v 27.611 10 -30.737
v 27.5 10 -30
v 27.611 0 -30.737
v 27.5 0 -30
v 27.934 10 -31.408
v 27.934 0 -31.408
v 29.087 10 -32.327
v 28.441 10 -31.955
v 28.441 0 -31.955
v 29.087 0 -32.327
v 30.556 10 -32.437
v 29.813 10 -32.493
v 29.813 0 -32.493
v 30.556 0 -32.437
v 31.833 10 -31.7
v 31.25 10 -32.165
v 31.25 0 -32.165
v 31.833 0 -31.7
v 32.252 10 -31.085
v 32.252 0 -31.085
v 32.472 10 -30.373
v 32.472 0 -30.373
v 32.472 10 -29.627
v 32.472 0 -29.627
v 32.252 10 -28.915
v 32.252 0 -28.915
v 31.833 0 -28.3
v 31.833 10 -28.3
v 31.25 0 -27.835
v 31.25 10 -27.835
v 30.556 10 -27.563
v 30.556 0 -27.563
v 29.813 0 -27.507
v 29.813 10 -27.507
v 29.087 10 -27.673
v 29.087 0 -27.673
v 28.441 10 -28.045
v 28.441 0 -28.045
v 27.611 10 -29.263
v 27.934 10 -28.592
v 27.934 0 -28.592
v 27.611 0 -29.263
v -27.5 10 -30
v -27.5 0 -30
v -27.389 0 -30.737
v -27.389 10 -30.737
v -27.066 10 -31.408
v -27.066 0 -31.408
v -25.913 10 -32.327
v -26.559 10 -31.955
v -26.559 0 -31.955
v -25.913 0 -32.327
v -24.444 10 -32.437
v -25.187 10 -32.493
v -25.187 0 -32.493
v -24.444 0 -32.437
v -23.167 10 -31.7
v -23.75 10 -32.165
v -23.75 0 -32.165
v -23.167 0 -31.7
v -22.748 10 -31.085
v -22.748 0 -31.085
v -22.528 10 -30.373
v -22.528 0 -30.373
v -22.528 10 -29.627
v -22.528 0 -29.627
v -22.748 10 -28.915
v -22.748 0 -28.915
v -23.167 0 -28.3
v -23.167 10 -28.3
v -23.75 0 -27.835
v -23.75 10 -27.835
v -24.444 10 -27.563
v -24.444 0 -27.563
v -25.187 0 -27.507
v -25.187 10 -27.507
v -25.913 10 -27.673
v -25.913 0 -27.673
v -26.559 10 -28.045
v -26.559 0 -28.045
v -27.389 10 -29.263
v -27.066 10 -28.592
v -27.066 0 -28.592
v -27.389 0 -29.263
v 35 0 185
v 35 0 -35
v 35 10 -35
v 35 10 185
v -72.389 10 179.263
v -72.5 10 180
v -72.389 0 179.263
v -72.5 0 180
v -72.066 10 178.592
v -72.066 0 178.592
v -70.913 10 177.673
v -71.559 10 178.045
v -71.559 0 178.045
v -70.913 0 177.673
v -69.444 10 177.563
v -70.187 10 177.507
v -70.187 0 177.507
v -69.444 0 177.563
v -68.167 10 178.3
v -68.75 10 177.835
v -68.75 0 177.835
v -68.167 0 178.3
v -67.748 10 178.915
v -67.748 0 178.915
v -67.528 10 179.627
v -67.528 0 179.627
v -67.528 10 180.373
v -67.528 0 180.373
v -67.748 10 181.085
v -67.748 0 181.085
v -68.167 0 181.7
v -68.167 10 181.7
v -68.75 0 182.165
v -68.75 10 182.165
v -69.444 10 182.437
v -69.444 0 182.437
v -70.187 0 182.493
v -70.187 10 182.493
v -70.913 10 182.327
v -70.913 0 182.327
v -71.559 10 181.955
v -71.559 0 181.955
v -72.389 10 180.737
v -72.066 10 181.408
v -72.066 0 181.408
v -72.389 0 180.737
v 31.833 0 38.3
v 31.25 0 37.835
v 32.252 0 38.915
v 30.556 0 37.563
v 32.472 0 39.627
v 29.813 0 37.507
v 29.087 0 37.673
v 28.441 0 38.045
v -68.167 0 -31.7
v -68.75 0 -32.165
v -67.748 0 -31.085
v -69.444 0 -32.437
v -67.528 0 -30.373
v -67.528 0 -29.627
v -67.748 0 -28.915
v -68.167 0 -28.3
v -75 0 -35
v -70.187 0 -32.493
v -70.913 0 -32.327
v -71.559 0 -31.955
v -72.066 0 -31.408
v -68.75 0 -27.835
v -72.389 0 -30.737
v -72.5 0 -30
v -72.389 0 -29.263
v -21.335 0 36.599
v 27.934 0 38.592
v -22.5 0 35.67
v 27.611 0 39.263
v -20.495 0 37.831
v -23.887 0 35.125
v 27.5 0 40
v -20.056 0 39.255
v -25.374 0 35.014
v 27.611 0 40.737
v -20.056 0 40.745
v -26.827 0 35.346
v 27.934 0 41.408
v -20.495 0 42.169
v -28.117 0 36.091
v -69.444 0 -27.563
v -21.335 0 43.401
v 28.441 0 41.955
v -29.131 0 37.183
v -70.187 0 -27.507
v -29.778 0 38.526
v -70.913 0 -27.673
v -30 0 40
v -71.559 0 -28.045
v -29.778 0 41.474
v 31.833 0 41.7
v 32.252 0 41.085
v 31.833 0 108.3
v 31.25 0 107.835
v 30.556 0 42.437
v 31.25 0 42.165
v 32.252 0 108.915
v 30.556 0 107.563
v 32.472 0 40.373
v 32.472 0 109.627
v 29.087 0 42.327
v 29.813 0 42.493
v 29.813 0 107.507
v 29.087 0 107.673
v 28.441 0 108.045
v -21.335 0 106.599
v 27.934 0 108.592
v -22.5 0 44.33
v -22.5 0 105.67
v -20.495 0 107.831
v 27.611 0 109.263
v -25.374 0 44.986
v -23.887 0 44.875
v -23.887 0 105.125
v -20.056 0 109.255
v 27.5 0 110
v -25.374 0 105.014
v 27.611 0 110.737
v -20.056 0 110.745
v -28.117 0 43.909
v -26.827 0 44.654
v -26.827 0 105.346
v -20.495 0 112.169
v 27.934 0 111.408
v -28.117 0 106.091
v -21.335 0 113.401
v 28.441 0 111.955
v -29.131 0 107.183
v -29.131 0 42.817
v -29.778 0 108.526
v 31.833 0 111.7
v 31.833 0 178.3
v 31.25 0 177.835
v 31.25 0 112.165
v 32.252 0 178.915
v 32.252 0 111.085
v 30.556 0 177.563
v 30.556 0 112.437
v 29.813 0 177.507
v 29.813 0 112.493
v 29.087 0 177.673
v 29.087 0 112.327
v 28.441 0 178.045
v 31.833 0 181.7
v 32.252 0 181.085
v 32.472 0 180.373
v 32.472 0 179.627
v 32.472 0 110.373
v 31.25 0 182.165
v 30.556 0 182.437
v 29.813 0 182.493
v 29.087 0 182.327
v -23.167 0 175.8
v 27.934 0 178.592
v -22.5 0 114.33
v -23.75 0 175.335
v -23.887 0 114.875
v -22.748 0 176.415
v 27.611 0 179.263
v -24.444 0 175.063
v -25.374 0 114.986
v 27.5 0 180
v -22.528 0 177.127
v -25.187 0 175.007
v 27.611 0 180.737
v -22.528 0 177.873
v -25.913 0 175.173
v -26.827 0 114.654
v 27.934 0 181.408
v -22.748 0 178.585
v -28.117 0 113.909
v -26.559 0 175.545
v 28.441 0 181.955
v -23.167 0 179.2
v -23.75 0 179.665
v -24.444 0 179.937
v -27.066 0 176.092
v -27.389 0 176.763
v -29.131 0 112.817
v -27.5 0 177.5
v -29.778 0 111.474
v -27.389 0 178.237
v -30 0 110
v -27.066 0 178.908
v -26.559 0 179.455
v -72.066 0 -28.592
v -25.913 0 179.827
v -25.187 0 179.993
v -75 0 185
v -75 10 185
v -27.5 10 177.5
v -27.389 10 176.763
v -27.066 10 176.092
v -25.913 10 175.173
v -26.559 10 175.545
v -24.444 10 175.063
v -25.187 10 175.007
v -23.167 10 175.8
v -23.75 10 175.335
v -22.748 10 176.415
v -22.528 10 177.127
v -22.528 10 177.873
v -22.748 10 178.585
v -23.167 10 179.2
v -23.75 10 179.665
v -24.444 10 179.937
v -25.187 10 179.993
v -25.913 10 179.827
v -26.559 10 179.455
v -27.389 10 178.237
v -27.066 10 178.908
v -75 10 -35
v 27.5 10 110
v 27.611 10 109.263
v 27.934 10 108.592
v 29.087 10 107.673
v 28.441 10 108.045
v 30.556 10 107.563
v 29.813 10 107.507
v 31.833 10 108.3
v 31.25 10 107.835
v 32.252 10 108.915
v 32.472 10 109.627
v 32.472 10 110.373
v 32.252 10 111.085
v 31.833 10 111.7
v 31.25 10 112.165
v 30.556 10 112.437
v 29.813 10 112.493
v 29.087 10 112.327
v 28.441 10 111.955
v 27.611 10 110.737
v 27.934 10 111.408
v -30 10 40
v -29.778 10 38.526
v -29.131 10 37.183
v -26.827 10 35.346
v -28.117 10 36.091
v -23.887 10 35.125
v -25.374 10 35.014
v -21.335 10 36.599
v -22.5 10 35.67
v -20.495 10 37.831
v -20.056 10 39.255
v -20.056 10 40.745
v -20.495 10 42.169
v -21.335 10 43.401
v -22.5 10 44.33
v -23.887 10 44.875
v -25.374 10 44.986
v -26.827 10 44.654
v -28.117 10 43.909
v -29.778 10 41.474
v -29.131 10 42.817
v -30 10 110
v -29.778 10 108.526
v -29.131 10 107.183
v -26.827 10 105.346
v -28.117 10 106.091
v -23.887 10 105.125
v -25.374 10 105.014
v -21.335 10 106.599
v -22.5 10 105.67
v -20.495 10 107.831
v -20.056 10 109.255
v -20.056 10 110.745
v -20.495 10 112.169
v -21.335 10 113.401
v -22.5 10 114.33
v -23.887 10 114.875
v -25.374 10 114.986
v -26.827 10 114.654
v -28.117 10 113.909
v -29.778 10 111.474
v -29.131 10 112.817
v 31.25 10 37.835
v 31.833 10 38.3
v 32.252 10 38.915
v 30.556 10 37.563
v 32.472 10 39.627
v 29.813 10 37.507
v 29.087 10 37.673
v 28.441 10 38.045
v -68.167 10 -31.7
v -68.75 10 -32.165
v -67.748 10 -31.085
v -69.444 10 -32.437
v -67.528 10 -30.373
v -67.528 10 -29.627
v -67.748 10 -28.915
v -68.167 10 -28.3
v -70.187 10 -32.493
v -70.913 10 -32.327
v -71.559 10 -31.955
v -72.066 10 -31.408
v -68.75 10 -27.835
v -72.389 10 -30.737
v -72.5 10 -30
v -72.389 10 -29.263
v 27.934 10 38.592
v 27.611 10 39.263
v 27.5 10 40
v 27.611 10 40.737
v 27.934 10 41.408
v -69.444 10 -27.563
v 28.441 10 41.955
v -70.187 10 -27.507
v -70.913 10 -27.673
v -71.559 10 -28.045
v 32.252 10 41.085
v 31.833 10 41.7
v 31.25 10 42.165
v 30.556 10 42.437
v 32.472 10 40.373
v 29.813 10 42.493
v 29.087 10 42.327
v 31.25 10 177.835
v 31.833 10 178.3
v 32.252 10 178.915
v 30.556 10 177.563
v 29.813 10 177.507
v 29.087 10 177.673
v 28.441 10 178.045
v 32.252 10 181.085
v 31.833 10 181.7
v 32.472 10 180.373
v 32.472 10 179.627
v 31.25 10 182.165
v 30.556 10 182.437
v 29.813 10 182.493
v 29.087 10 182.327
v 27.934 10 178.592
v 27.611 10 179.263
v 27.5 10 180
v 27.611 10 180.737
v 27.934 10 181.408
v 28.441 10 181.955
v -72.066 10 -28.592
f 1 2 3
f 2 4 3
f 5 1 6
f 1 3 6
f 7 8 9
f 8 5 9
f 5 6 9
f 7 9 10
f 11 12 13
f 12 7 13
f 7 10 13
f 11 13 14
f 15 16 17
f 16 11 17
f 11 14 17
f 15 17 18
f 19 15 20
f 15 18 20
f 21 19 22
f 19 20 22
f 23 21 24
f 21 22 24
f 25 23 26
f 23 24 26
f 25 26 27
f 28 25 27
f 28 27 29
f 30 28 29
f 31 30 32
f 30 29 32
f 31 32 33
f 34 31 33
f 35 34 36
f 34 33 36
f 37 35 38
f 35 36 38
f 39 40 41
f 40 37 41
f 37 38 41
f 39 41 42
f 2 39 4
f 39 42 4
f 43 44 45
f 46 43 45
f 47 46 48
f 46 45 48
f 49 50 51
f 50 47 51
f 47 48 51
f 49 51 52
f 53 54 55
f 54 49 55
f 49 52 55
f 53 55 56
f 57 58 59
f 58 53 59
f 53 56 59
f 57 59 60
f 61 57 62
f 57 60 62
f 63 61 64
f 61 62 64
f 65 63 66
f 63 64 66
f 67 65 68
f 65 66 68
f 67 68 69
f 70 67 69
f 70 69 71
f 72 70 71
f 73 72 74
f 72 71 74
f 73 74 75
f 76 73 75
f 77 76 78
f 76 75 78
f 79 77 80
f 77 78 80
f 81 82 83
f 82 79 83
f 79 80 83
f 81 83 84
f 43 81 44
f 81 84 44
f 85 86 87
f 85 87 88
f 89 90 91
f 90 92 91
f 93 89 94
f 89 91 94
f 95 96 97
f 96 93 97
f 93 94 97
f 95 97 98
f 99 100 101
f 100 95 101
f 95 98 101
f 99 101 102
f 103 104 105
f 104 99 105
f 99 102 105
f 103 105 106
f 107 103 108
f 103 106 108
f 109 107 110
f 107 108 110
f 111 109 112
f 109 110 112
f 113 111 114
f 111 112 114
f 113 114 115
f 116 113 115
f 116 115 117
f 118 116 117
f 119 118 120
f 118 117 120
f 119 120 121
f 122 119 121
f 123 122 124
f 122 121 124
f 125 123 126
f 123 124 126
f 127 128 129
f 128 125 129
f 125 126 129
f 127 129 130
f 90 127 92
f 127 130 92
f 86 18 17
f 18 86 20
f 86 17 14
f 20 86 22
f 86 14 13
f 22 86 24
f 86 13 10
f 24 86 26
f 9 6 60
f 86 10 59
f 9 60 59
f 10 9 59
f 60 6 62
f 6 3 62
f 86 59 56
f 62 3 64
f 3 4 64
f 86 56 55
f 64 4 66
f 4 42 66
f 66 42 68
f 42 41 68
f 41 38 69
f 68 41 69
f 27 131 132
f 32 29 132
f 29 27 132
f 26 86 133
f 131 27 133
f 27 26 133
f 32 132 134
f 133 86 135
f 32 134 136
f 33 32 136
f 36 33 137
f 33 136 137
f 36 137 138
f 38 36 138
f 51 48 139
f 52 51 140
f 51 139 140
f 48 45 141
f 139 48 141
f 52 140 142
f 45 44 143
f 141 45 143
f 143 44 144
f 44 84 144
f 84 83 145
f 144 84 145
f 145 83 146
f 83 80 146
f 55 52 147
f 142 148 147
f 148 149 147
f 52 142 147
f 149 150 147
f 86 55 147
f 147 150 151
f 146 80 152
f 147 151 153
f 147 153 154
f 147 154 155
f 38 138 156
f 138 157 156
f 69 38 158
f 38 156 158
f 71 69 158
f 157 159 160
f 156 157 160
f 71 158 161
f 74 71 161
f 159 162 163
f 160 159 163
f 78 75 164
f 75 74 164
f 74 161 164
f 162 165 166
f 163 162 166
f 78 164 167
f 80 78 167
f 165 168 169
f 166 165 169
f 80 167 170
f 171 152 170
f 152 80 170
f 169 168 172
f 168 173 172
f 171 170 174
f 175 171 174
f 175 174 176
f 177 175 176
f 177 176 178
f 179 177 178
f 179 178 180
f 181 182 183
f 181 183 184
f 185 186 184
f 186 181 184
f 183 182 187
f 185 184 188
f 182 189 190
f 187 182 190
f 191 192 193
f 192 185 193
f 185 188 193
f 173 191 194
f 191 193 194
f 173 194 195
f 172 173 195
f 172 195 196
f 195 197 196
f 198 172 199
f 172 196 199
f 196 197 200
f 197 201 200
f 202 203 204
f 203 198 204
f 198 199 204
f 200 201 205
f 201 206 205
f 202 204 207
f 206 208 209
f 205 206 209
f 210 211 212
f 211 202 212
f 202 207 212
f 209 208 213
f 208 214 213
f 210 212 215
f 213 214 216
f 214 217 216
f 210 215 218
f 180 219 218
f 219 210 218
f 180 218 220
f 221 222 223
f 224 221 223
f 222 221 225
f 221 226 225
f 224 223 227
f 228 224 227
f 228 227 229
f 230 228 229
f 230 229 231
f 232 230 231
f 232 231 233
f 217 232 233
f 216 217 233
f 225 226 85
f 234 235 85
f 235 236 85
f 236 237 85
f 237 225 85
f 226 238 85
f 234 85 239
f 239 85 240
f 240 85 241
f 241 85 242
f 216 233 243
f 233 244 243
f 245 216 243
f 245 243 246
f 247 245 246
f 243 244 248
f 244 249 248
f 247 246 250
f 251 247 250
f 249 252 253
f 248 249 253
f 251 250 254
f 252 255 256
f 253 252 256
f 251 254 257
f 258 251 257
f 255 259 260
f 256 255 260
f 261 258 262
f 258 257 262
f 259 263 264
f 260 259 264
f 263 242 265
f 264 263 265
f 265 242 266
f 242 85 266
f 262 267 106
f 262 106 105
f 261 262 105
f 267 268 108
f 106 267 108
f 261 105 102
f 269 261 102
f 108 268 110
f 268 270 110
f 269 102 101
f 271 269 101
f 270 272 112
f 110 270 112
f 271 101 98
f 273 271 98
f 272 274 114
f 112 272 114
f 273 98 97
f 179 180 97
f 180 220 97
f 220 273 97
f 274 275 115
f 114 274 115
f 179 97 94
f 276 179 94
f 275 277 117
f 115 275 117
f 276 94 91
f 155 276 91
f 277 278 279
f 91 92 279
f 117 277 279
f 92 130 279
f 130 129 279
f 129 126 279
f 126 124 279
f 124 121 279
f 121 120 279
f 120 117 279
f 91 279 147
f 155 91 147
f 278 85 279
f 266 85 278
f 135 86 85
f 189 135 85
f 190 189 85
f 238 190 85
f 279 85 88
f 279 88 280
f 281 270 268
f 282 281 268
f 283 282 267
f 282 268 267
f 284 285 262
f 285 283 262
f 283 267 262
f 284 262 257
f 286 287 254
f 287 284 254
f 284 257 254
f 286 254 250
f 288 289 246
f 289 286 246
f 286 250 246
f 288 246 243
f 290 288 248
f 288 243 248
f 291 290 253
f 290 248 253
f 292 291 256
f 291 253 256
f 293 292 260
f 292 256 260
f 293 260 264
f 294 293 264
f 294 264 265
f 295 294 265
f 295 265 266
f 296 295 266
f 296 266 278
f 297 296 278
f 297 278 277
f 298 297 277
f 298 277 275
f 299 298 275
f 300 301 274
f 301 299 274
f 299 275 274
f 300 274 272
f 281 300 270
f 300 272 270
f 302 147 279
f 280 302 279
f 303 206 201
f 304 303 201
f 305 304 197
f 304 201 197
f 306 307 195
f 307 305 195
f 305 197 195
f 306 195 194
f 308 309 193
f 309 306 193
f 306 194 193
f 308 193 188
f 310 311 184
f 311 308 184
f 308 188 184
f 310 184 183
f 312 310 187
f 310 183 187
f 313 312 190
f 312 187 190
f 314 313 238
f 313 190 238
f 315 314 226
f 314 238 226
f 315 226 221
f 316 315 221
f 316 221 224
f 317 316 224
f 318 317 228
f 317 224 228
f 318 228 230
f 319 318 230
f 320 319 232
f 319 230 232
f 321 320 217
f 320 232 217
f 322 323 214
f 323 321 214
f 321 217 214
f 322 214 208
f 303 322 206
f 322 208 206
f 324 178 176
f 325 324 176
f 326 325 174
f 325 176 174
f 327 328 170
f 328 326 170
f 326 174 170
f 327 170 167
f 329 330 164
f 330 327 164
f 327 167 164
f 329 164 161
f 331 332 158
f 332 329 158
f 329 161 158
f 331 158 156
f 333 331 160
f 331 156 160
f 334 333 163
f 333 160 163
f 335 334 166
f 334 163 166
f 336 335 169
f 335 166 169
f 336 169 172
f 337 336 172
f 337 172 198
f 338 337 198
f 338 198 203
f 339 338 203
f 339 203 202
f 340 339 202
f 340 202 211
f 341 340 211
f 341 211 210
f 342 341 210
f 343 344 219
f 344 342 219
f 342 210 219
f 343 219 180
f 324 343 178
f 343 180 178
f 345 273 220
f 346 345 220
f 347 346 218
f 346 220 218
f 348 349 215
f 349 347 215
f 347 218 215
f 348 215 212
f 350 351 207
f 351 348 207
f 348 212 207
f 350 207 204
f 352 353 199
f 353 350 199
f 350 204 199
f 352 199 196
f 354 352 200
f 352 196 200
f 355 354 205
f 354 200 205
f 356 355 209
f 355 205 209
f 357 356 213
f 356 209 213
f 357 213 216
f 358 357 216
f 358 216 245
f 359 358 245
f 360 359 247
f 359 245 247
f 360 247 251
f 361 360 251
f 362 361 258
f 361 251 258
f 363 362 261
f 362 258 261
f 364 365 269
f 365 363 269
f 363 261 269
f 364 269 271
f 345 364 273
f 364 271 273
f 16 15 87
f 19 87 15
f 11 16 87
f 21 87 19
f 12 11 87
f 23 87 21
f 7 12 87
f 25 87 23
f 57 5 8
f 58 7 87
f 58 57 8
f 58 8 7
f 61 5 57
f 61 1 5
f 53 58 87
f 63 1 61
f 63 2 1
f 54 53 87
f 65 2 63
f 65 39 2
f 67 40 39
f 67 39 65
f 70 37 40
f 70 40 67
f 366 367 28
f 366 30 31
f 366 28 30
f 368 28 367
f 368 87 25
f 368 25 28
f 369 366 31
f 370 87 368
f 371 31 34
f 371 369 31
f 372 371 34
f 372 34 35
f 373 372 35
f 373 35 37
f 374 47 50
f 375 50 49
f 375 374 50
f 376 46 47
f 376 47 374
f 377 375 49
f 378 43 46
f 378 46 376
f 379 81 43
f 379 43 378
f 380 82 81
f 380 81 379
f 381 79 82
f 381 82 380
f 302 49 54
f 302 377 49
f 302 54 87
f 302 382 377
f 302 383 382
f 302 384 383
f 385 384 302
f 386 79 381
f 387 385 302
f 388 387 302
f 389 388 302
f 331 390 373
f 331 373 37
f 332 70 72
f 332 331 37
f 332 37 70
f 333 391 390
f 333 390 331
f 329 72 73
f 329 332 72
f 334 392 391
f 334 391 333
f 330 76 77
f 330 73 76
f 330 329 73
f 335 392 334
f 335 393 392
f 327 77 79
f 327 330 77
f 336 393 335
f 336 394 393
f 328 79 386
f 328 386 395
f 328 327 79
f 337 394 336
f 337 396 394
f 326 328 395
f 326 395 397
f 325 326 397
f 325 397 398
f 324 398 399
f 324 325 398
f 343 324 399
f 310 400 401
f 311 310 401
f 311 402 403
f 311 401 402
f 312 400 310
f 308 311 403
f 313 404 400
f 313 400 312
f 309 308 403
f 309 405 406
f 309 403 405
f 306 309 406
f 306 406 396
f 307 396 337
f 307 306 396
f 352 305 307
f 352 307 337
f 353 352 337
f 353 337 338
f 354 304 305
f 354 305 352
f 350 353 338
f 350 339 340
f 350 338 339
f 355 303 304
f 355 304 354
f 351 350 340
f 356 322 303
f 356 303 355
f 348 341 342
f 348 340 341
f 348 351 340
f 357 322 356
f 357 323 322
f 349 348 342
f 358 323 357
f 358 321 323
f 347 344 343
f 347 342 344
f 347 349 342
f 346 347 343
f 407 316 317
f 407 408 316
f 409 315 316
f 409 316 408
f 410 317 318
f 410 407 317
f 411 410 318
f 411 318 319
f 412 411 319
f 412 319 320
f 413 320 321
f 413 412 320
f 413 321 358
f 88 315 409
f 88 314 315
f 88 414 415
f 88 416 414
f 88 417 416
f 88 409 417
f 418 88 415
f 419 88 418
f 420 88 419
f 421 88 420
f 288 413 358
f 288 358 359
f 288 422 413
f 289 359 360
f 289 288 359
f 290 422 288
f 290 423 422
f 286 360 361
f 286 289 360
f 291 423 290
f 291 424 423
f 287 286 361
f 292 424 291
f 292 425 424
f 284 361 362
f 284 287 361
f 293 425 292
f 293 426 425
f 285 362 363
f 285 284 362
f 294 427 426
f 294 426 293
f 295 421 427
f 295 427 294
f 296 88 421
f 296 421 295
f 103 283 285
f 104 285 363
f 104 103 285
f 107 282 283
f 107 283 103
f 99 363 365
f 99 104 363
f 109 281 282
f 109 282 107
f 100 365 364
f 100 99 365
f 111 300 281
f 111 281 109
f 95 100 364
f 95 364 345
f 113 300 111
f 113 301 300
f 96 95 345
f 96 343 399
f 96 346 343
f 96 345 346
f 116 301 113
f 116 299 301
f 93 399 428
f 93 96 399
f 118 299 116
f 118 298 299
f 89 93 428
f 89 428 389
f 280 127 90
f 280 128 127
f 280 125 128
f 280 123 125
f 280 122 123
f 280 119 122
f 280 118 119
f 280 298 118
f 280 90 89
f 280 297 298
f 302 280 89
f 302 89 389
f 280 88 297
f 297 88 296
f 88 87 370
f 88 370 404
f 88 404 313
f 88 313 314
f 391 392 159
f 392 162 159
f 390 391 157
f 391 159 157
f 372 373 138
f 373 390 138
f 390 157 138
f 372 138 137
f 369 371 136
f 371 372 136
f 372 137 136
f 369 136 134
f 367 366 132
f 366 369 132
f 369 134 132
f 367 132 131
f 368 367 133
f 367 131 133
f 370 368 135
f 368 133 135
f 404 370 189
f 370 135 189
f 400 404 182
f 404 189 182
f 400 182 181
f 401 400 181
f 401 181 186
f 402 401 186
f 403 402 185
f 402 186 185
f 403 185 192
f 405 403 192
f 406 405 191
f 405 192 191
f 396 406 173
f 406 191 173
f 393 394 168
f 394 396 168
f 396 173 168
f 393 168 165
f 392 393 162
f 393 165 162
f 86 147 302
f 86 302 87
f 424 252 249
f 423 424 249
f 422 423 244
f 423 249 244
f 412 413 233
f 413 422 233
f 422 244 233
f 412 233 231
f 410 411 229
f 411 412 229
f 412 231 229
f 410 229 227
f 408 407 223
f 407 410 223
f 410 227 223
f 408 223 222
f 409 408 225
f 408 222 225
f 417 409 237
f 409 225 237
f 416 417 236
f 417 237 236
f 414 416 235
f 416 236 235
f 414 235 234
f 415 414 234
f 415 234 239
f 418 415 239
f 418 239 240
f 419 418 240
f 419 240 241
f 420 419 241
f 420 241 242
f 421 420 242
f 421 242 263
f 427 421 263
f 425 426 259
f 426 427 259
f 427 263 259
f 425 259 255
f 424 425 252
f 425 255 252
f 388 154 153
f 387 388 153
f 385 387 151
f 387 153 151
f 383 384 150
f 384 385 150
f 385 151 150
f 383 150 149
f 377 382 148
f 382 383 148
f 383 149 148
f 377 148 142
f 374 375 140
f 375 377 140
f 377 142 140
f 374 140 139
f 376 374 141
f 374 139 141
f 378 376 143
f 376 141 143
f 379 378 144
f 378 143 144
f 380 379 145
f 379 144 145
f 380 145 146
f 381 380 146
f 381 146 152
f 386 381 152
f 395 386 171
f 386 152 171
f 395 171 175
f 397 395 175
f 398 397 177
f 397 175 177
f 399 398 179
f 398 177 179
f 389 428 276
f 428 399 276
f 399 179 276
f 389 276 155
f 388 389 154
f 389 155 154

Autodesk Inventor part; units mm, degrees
ref_plane "YZ Plane" through (0, 0, 0) normal (1, 0, 0) x (0, 1, 0)
ref_plane "XZ Plane" through (0, 0, 0) normal (0, 1, 0) x (-1, 0, 0)
ref_plane "XY Plane" through (0, 0, 0) normal (0, 0, 1) x (1, 0, 0)
sketch "Block1" plane through (0, 0, 0) normal (0, 0, 1) x (1, 0, 0)
  line L0 (-75.22, -185.22) -> (-75.22, 35.22)
  line L1 (-75.22, 35.22) -> (35.22, 35.22)
  line L2 (35.22, 35.22) -> (35.22, -185.22)
  line L3 (35.22, -185.22) -> (-75.22, -185.22)
  circle A0 centre (-70, -180) radius 2.72
  circle A1 centre (-25, -177.5) radius 2.72
  circle A2 centre (30, -180) radius 2.72
  circle A3 centre (-25, 30) radius 2.72
  circle A4 centre (-70, 30) radius 2.72
  circle A5 centre (30, -40) radius 2.72
  circle A6 centre (30, -110) radius 2.72
  circle A7 centre (-25, -110) radius 5.22
  circle A8 centre (-25, -40) radius 5.22
  circle A9 centre (30, 30) radius 2.72
  point P0 (-15, -74.8437)
sketch "Sketch1" plane through (0, 0, 0) normal (0, 1, 0) x (-1, 0, 0)
  line L0 (0, 0) -> (75, 0)
  line L1 (75, 0) -> (75, 185)
  line L2 (75, 185) -> (0, 185)
  circle A0 centre (25, 110) radius 5
  circle A1 centre (25, 40) radius 5
  line L3 (75, 185) -> (100, 185)
  line L4 (75, 0) -> (100, 0)
  line L5 (0, 0) -> (-35, 0)
  line L6 (-35, 0) -> (-35, 185)
  line L7 (-35, 185) -> (0, 185)
  line L8 (106.8257, 75) -> (-45.4509, 75)
  line L9 (-35, 0) -> (75, 0)
  line L10 (75, 0) -> (75, -35)
  line L11 (75, -35) -> (-35, -35)
  line L12 (-35, -35) -> (-35, 0)
  circle A2 centre (-30, 180) radius 2.5
  circle A3 centre (70, 180) radius 2.5
  circle A4 centre (-30, -30) radius 2.5
  circle A5 centre (70, -30) radius 2.5
  circle A6 centre (-30, 110) radius 2.5
  circle A7 centre (-30, 40) radius 2.5
  circle A8 centre (25, 177.5) radius 2.5
  circle A9 centre (25, -30) radius 2.5
  dimension "d5" = 10
  dimension "d9" = 70
  dimension "d13" = 35
  dimension "d14" = 50
  dimension "d17" = 75
  dimension "d18" = 185
  dimension "d19" = 35
  dimension "d22" = 5
  dimension "d23" = 5
  dimension "d24" = 5
  dimension "d25" = 5
  dimension "d26" = 5
  dimension "d27" = 5
  dimension "d28" = 5
  dimension "d29" = 5
  dimension "d30" = 5
  dimension "d31" = 5
  dimension "d32" = 5
  dimension "d33" = 75
  dimension "d34" = 5
  dimension "d35" = 75
  dimension "d36" = 5
  dimension "d37" = 5
  dimension "d38" = 5
  dimension "d39" = 5
  dimension "d42" = 5
  dimension "d43" = 50
  dimension "d46" = 5
  dimension "d47" = 5
  dimension "d48" = 50
extrude "Extrusion5" add sketch "Sketch1" along normal blind 10
sketch "Sketch2" plane through (0, 10, 0) normal (0, 1, 0) x (1, 0, 0)
  circle A0 centre (-25, -40) radius 5 projected
  circle A1 centre (-25, -110) radius 5 projected
  circle A2 centre (-25, -177.5) radius 2.5 projected
  circle A3 centre (30, -40) radius 2.5 projected
  circle A4 centre (30, -110) radius 2.5 projected
  circle A5 centre (-70, -180) radius 2.5 projected
  circle A6 centre (30, -180) radius 2.5 projected
  circle A7 centre (-25, 30) radius 2.5 projected
  circle A8 centre (-70, 30) radius 2.5 projected
  circle A9 centre (30, 30) radius 2.5 projected
  line L0 (35, -185) -> (35, 35) projected
  line L1 (35, 35) -> (-75, 35) projected
  line L2 (-75, 35) -> (-75, -185) projected
  line L3 (-75, -185) -> (35, -185) projected
  point P0 (0, 0)
sketch "DXF" plane through (0, 0, 0) normal (0, 1, 0) x (-1, 0, 0)
  point P0 (0, 0)
properties part number "shaft_cover"
